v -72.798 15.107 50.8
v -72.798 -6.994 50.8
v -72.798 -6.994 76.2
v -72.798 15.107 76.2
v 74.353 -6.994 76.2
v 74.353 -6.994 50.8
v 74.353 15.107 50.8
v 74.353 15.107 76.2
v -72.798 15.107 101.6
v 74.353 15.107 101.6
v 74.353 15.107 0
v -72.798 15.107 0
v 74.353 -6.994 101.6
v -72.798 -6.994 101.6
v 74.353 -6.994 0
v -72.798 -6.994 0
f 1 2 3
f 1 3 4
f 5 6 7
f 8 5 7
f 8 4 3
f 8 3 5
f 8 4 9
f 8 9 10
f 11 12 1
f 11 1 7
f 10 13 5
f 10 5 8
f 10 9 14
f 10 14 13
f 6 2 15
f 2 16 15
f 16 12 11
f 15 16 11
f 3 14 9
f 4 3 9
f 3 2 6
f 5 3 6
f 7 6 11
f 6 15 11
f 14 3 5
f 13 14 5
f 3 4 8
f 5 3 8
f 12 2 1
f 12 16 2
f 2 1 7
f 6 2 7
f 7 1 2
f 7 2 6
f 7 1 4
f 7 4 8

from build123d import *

# Parameters (mm, degrees)
F0_W     = 147.1512690187
F0_H     = 22.1006646752
F1_DEPTH = 25.4
F2_DEPTH = 25.4
F3_DEPTH = 25.4
F4_DEPTH = 25.4


with BuildPart() as f1:
    # F0 (on Top) → F1 (new body)
    with BuildSketch(Plane.XY):
        with Locations((0.7775165141, 4.0564509109)):
            Rectangle(F0_W, F0_H)
    extrude(amount=F1_DEPTH)

    # F2 (add): a face of the model
    f2_faces = [f1.faces().sort_by_distance(p)[0] for p in [
        (0.7775165141, 4.0564509109, 25.4),
    ]]
    extrude(f2_faces, amount=F2_DEPTH)


with BuildPart() as f3:
    # F3 (new): a face of the model
    f3_faces = [f1.part.faces().sort_by_distance(p)[0] for p in [
        (0.7775165141, 4.0564509109, 50.8),
    ]]
    extrude(f3_faces, amount=F3_DEPTH)


with BuildPart() as f4:
    # F4 (new): a face of the model
    f4_faces = [f3.part.faces().sort_by_distance(p)[0] for p in [
        (0.7775165141, 4.0564509109, 76.2),
    ]]
    extrude(f4_faces, amount=F4_DEPTH)


solid = Compound([f1.part, f3.part, f4.part])
